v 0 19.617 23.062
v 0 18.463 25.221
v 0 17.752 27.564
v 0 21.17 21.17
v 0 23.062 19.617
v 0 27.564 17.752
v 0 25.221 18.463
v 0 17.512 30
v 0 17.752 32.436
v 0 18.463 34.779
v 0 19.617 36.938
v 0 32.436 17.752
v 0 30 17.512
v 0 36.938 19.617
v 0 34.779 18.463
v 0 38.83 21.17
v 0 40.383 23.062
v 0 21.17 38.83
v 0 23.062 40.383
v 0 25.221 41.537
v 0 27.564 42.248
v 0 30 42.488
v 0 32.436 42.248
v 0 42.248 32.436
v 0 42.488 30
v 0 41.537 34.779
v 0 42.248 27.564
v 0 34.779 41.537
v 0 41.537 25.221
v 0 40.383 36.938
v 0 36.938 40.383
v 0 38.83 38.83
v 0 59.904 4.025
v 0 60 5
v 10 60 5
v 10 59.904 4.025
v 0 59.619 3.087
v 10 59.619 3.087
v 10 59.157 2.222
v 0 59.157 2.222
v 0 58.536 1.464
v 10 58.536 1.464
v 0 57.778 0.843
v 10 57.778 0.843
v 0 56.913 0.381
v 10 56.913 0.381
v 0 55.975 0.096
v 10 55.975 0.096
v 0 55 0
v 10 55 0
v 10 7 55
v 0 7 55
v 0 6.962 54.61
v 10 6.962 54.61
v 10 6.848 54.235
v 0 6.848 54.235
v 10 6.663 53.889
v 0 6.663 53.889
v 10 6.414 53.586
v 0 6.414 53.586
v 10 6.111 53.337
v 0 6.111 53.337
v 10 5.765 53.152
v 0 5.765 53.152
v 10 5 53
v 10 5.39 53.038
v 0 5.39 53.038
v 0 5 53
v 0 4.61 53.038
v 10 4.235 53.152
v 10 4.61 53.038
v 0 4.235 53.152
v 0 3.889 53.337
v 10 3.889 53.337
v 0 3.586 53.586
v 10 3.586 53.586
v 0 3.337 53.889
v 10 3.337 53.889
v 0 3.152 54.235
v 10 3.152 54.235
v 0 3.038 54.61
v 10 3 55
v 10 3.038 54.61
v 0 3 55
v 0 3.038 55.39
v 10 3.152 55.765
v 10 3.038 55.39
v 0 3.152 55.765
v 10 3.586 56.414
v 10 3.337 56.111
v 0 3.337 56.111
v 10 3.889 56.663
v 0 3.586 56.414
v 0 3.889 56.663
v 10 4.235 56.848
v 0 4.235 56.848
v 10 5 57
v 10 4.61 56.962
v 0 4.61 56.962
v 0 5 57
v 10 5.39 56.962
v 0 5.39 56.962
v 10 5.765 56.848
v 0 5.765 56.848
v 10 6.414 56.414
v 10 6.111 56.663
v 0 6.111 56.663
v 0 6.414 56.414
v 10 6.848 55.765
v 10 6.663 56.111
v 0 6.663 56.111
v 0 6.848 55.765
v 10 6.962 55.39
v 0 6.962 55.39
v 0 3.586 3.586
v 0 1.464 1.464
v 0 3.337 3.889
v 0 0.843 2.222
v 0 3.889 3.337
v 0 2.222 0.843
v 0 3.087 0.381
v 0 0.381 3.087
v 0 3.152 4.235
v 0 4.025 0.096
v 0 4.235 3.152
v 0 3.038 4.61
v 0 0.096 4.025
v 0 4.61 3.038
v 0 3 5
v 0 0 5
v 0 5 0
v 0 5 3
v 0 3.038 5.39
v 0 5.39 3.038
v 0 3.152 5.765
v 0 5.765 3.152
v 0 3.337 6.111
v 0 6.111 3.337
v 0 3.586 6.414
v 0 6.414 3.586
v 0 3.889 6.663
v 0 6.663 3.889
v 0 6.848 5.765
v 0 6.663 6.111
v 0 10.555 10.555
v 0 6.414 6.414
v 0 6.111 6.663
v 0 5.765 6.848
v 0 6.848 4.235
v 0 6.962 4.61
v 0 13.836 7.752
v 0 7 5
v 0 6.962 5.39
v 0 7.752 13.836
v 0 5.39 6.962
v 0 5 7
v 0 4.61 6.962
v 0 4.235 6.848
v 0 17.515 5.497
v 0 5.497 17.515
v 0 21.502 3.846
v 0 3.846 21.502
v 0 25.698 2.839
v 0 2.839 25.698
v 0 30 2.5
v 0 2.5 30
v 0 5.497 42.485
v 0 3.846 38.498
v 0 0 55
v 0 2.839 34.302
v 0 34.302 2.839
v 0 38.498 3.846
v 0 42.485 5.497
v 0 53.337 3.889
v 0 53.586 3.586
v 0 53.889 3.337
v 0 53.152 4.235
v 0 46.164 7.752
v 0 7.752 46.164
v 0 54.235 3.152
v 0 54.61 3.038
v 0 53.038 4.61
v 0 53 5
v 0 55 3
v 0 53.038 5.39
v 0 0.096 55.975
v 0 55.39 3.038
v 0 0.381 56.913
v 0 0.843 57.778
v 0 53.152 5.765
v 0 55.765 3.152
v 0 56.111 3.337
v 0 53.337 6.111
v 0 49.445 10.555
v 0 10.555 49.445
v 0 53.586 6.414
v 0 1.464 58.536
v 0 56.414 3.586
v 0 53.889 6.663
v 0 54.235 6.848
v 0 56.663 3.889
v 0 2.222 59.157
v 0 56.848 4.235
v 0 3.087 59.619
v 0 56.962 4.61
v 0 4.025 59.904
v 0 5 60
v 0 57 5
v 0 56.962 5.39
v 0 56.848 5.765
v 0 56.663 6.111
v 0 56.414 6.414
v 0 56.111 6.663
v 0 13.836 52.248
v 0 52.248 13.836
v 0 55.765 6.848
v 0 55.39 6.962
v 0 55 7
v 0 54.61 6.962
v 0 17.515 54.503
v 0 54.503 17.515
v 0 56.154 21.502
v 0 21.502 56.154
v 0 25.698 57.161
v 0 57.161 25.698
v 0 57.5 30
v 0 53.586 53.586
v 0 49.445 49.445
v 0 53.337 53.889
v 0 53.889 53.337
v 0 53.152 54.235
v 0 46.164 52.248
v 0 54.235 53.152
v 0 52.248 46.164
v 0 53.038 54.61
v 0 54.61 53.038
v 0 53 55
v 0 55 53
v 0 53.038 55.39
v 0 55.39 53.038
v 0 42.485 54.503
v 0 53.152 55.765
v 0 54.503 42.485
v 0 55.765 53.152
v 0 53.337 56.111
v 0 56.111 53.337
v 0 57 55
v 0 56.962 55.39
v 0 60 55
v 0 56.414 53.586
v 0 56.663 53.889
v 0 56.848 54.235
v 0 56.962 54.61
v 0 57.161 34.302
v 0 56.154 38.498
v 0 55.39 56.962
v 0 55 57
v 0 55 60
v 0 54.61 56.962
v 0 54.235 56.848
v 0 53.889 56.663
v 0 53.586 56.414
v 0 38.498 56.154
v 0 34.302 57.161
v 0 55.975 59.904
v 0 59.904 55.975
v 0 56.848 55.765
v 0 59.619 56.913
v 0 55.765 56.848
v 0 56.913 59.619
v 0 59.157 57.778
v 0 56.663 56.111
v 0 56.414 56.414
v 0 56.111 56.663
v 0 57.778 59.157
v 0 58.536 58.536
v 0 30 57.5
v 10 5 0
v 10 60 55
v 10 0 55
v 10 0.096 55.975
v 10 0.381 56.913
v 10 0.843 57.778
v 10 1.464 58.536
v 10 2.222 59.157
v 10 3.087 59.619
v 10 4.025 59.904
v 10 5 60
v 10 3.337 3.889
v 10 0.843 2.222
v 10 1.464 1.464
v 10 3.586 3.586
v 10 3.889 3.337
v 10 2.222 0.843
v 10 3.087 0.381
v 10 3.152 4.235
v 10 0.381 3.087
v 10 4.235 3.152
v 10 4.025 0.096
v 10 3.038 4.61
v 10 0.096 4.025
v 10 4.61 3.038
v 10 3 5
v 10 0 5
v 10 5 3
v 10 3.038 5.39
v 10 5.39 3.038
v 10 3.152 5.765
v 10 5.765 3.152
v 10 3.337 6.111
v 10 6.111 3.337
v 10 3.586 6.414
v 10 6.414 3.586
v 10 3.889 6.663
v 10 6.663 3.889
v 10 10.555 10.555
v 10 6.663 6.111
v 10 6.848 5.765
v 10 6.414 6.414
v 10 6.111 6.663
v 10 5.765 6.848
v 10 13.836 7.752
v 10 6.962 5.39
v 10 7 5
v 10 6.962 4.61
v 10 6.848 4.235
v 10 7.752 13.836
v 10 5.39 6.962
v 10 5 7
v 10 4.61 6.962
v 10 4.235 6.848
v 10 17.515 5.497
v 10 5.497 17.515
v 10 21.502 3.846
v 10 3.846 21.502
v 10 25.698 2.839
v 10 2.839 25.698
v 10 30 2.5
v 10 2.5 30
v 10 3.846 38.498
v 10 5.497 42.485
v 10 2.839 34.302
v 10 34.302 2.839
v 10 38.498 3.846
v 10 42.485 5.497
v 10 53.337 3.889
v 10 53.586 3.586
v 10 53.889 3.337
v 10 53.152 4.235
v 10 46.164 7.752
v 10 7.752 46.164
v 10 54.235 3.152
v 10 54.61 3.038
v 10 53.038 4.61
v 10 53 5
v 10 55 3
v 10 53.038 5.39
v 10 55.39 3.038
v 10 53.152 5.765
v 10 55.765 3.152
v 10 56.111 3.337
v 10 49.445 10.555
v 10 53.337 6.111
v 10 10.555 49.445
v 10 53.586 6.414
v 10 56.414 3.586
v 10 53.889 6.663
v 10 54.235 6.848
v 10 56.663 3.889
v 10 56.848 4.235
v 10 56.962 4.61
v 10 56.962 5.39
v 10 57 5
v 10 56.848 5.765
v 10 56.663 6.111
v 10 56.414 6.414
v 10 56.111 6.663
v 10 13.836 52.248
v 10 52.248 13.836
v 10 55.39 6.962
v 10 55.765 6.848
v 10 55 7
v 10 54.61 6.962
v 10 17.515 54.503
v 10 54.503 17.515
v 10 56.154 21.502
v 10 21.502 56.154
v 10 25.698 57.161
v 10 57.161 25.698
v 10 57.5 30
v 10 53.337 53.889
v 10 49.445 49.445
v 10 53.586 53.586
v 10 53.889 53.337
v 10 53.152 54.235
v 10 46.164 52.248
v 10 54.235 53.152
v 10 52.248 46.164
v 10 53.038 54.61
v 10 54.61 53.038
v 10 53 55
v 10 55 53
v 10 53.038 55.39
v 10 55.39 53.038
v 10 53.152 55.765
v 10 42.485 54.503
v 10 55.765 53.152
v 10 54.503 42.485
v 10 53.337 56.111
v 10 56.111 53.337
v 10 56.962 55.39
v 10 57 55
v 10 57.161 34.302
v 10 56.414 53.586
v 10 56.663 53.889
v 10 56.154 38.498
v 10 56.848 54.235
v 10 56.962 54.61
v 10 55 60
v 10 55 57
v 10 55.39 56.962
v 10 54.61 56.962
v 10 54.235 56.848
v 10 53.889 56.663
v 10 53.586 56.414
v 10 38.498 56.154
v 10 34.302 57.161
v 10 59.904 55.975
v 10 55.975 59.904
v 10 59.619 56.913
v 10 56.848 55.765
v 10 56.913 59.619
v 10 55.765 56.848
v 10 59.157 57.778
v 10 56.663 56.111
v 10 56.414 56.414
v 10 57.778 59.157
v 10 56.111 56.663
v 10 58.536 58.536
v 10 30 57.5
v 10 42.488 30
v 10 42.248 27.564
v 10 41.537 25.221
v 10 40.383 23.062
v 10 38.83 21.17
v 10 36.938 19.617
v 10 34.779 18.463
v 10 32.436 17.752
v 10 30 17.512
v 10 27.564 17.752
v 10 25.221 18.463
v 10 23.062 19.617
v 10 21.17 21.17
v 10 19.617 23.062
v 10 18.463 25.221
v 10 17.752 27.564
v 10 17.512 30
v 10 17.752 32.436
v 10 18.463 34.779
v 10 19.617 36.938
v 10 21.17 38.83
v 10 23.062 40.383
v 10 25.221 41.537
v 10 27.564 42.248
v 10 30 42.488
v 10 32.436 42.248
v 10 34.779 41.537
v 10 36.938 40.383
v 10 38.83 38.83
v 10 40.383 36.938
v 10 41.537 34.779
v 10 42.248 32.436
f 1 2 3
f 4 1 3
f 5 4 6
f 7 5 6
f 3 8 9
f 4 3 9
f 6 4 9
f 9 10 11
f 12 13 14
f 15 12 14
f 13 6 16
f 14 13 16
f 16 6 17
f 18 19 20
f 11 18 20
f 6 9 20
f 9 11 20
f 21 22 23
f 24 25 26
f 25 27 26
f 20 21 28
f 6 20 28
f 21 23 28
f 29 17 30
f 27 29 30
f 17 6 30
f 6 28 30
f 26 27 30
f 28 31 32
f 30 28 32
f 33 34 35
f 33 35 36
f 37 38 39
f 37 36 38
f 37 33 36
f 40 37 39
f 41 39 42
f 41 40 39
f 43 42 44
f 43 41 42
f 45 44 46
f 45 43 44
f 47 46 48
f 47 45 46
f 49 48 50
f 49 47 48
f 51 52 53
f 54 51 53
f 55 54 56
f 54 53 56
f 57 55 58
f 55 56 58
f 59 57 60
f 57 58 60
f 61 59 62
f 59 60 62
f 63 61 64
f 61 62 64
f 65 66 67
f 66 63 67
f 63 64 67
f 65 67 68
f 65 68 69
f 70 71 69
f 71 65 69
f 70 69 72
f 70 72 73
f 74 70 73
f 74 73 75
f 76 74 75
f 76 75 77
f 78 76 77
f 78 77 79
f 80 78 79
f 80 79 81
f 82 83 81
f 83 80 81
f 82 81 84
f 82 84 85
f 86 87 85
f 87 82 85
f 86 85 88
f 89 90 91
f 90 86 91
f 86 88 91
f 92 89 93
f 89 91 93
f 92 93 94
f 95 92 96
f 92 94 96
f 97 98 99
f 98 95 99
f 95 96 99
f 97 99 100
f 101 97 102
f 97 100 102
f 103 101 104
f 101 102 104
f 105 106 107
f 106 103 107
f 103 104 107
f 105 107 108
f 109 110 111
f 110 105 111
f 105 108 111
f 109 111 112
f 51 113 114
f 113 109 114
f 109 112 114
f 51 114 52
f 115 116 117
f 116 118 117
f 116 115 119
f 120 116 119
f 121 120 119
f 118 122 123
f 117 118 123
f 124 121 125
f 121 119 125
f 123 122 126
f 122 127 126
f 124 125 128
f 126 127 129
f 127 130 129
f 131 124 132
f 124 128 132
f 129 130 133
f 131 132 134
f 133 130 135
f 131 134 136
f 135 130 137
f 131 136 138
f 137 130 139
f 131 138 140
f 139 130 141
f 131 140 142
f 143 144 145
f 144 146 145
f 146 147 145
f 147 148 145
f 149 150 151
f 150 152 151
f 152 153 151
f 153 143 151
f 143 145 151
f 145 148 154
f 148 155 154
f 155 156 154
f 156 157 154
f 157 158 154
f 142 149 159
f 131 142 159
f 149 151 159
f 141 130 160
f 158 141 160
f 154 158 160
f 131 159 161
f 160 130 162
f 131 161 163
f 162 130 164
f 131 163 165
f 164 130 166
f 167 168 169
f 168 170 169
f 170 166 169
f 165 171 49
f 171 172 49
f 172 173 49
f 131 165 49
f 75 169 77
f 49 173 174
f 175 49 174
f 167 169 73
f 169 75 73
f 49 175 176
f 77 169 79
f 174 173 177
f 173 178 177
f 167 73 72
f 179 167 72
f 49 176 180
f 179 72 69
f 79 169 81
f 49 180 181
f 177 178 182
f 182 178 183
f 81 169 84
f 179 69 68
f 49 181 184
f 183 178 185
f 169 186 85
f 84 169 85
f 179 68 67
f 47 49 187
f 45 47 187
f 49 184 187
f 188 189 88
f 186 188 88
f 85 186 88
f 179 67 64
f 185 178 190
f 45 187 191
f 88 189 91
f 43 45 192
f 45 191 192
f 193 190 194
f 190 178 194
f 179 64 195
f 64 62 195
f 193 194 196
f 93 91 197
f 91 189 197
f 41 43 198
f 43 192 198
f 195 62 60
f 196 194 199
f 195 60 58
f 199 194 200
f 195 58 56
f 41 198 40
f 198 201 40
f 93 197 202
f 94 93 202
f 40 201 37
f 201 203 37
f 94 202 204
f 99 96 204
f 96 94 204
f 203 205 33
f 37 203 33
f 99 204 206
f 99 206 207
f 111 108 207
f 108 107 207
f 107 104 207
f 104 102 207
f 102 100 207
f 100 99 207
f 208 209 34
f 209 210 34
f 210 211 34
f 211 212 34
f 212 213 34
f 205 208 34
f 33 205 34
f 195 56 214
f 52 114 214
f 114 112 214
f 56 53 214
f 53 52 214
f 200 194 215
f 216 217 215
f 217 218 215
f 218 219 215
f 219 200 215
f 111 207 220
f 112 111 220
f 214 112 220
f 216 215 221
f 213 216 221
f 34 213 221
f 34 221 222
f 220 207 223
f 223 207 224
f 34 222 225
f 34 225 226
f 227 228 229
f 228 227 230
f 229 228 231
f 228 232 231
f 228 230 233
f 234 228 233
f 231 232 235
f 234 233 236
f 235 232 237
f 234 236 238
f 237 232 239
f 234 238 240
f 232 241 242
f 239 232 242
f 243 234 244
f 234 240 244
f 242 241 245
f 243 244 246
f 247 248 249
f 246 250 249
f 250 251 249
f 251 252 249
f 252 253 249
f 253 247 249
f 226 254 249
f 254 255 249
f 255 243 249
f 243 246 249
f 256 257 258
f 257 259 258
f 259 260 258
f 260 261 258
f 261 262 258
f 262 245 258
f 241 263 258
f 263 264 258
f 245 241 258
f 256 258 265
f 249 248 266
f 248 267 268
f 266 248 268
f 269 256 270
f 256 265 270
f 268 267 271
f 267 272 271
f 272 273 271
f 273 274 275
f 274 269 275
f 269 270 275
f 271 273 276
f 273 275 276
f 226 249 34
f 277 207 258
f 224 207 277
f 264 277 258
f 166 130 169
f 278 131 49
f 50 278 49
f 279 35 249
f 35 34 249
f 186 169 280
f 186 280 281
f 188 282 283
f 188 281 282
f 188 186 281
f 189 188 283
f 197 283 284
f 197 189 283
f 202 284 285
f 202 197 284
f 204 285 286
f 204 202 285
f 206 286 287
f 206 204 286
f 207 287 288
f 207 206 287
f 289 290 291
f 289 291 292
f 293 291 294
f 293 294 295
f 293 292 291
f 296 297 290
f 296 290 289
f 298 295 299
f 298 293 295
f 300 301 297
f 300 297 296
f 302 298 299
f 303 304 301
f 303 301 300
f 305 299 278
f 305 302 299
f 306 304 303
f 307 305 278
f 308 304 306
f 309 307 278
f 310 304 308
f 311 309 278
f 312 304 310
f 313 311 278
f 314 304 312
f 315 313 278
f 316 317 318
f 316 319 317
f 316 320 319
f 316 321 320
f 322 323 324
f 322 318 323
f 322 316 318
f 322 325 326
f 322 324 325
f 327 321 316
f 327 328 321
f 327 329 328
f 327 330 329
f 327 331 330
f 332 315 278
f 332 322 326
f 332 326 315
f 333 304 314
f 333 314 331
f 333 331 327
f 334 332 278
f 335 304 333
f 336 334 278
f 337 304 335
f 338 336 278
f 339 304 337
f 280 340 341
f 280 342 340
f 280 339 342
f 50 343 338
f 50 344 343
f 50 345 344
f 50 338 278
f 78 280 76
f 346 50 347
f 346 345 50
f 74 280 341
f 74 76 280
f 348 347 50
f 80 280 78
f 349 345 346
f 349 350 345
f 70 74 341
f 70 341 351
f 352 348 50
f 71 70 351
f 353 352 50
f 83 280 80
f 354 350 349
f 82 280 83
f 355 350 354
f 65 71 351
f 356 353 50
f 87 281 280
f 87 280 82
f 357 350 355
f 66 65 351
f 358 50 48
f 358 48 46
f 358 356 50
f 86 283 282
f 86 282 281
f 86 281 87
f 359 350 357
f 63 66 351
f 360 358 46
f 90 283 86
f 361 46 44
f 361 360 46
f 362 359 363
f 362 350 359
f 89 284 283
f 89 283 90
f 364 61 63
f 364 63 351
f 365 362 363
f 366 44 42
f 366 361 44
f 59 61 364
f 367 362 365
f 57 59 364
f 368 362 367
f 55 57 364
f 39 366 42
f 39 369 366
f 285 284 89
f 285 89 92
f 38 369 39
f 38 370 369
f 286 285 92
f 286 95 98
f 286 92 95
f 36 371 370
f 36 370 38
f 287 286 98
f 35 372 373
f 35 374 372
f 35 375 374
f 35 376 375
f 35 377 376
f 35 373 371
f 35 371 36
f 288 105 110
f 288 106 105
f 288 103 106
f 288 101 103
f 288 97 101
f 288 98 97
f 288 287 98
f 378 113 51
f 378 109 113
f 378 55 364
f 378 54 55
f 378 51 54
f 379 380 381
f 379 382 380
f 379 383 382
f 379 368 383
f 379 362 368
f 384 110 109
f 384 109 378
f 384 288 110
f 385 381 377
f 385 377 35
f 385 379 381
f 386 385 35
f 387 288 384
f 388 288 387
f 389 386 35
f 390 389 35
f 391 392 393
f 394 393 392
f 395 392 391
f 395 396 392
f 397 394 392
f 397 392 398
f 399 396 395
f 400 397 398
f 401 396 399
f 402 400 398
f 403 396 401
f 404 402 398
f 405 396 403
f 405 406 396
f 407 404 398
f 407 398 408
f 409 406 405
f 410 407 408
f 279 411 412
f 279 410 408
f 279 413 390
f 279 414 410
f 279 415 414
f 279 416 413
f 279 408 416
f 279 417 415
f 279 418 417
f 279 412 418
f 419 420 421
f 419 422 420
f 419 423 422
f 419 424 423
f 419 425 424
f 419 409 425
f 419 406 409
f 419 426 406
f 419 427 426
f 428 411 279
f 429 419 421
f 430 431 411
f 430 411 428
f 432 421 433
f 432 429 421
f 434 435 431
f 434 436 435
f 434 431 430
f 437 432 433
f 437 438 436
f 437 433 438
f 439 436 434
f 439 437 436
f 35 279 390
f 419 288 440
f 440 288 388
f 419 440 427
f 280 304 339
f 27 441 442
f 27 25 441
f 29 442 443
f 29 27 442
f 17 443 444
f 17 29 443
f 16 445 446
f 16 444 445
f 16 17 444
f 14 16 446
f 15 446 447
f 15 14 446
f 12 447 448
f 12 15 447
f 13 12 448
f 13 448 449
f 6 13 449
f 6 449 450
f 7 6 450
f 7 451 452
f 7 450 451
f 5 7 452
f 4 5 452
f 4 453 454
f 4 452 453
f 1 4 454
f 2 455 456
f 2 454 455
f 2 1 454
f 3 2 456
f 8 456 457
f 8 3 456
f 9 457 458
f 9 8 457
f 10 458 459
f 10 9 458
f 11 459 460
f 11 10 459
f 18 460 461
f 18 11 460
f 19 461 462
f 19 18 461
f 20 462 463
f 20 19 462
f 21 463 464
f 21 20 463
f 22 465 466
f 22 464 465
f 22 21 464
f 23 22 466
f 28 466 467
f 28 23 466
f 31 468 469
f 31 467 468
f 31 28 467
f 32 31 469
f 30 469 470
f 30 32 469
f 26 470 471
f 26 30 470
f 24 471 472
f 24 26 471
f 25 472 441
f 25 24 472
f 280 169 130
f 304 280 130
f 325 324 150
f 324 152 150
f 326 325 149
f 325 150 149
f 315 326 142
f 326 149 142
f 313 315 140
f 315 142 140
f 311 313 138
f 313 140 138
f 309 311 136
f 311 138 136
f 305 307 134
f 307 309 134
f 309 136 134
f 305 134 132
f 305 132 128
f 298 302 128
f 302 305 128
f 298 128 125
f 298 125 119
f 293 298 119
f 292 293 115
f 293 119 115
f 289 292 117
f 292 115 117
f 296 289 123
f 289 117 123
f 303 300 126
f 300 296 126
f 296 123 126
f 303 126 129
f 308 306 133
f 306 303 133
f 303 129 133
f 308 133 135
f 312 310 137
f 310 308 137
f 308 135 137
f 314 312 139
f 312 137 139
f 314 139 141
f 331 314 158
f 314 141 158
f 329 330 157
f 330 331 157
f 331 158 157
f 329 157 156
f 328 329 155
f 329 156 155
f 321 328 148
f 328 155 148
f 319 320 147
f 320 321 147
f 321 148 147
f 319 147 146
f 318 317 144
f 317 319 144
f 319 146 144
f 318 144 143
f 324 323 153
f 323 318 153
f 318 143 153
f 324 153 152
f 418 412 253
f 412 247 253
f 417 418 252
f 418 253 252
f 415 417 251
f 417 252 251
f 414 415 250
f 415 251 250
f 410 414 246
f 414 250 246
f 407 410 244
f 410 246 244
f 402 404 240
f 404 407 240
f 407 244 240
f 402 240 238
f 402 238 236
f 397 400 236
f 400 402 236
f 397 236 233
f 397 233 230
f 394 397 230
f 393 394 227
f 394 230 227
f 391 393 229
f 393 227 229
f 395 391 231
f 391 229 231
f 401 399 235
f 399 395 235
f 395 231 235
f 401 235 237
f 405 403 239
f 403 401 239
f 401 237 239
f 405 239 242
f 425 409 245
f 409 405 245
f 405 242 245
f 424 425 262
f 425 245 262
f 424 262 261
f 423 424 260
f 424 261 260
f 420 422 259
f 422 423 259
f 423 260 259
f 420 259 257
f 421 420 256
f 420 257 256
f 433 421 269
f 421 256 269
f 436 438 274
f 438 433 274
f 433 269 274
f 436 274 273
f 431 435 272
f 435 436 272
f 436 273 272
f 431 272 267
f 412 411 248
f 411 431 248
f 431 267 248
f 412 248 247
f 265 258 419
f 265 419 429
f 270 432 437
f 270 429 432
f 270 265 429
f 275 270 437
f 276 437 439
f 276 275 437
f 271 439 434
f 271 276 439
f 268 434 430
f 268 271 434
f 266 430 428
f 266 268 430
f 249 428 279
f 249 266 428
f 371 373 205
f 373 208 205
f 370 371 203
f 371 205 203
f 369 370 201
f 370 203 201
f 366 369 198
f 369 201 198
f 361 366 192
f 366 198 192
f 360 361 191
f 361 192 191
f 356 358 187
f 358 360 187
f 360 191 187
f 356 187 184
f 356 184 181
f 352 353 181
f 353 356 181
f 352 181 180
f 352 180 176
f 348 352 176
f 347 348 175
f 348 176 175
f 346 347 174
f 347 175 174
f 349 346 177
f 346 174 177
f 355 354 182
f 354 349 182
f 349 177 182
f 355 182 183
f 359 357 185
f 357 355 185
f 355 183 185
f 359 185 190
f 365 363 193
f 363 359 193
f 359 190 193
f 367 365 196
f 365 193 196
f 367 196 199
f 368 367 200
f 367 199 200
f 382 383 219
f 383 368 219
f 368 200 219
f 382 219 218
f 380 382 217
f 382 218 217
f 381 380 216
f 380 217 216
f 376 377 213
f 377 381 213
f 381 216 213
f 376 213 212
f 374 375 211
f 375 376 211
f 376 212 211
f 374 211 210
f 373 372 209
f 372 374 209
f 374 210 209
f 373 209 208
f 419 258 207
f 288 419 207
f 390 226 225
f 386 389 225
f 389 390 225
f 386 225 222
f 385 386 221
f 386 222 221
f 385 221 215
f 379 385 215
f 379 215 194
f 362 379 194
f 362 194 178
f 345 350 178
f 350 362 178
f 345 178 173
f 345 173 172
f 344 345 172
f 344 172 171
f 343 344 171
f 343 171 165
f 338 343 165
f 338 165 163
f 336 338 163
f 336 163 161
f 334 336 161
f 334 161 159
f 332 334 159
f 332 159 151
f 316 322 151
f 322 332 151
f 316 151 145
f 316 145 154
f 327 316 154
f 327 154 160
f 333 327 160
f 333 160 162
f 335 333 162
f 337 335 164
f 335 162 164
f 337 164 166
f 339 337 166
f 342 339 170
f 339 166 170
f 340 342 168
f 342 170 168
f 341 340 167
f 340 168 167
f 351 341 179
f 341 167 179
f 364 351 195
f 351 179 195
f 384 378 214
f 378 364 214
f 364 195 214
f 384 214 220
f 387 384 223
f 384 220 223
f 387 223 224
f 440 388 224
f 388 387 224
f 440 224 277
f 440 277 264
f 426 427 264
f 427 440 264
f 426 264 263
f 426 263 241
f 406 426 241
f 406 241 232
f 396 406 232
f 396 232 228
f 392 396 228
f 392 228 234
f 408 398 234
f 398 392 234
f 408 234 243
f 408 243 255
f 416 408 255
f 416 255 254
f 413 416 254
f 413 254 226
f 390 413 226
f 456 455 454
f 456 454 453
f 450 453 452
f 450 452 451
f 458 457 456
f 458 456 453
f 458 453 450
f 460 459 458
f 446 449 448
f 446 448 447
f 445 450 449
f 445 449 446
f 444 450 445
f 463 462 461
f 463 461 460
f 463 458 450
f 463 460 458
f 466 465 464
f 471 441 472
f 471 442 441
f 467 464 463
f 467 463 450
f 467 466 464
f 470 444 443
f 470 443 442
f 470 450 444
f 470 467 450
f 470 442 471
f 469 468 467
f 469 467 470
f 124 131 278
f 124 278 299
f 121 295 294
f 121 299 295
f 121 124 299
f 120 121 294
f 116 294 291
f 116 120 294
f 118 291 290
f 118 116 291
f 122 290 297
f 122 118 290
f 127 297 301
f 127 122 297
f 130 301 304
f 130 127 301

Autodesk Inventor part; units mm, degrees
ref_plane "YZ Plane" through (0, 0, 0) normal (1, 0, 0) x (0, 1, 0)
ref_plane "XZ Plane" through (0, 0, 0) normal (0, 1, 0) x (-1, 0, 0)
ref_plane "XY Plane" through (0, 0, 0) normal (0, 0, 1) x (1, 0, 0)
sketch "Sketch1" plane through (0, 0, 0) normal (1, 0, 0) x (0, 1, 0)
  line L0 (5, 0) -> (55, 0)
  line L1 (60, 5) -> (60, 55)
  line L2 (55, 60) -> (5, 60)
  line L3 (0, 55) -> (0, 5)
  arc A0 (5, 60) -> (0, 55) centre (5, 55) ccw
  arc A1 (0, 5) -> (5, 0) centre (5, 5) ccw
  arc A2 (60, 55) -> (55, 60) centre (55, 55) ccw
  arc A3 (55, 0) -> (60, 5) centre (55, 5) ccw
  circle A4 centre (5, 55) radius 2
  circle A5 centre (5, 5) radius 2
  circle A6 centre (55, 5) radius 2
  circle A7 centre (55, 55) radius 2
  circle A8 centre (30, 30) radius 27.5
  circle A9 centre (30, 30) radius 12.4881
  point P0 (0, 0)
  point P1 (60, 60)
  point P2 (60, 0)
  point P3 (0, 60)
  dimension "d0" = 60
  dimension "d2" = 60
  dimension "d3" = 5
  dimension "d4" = 5
  dimension "d5" = 4
  dimension "d6" = 4
  dimension "d7" = 4
  dimension "d8" = 4
  dimension "d9" = 30
  dimension "d10" = 30
  dimension "d11" = 55
extrude "Extrusion1" add sketch "Sketch1" along normal blind 10
properties part number "fan_60"
